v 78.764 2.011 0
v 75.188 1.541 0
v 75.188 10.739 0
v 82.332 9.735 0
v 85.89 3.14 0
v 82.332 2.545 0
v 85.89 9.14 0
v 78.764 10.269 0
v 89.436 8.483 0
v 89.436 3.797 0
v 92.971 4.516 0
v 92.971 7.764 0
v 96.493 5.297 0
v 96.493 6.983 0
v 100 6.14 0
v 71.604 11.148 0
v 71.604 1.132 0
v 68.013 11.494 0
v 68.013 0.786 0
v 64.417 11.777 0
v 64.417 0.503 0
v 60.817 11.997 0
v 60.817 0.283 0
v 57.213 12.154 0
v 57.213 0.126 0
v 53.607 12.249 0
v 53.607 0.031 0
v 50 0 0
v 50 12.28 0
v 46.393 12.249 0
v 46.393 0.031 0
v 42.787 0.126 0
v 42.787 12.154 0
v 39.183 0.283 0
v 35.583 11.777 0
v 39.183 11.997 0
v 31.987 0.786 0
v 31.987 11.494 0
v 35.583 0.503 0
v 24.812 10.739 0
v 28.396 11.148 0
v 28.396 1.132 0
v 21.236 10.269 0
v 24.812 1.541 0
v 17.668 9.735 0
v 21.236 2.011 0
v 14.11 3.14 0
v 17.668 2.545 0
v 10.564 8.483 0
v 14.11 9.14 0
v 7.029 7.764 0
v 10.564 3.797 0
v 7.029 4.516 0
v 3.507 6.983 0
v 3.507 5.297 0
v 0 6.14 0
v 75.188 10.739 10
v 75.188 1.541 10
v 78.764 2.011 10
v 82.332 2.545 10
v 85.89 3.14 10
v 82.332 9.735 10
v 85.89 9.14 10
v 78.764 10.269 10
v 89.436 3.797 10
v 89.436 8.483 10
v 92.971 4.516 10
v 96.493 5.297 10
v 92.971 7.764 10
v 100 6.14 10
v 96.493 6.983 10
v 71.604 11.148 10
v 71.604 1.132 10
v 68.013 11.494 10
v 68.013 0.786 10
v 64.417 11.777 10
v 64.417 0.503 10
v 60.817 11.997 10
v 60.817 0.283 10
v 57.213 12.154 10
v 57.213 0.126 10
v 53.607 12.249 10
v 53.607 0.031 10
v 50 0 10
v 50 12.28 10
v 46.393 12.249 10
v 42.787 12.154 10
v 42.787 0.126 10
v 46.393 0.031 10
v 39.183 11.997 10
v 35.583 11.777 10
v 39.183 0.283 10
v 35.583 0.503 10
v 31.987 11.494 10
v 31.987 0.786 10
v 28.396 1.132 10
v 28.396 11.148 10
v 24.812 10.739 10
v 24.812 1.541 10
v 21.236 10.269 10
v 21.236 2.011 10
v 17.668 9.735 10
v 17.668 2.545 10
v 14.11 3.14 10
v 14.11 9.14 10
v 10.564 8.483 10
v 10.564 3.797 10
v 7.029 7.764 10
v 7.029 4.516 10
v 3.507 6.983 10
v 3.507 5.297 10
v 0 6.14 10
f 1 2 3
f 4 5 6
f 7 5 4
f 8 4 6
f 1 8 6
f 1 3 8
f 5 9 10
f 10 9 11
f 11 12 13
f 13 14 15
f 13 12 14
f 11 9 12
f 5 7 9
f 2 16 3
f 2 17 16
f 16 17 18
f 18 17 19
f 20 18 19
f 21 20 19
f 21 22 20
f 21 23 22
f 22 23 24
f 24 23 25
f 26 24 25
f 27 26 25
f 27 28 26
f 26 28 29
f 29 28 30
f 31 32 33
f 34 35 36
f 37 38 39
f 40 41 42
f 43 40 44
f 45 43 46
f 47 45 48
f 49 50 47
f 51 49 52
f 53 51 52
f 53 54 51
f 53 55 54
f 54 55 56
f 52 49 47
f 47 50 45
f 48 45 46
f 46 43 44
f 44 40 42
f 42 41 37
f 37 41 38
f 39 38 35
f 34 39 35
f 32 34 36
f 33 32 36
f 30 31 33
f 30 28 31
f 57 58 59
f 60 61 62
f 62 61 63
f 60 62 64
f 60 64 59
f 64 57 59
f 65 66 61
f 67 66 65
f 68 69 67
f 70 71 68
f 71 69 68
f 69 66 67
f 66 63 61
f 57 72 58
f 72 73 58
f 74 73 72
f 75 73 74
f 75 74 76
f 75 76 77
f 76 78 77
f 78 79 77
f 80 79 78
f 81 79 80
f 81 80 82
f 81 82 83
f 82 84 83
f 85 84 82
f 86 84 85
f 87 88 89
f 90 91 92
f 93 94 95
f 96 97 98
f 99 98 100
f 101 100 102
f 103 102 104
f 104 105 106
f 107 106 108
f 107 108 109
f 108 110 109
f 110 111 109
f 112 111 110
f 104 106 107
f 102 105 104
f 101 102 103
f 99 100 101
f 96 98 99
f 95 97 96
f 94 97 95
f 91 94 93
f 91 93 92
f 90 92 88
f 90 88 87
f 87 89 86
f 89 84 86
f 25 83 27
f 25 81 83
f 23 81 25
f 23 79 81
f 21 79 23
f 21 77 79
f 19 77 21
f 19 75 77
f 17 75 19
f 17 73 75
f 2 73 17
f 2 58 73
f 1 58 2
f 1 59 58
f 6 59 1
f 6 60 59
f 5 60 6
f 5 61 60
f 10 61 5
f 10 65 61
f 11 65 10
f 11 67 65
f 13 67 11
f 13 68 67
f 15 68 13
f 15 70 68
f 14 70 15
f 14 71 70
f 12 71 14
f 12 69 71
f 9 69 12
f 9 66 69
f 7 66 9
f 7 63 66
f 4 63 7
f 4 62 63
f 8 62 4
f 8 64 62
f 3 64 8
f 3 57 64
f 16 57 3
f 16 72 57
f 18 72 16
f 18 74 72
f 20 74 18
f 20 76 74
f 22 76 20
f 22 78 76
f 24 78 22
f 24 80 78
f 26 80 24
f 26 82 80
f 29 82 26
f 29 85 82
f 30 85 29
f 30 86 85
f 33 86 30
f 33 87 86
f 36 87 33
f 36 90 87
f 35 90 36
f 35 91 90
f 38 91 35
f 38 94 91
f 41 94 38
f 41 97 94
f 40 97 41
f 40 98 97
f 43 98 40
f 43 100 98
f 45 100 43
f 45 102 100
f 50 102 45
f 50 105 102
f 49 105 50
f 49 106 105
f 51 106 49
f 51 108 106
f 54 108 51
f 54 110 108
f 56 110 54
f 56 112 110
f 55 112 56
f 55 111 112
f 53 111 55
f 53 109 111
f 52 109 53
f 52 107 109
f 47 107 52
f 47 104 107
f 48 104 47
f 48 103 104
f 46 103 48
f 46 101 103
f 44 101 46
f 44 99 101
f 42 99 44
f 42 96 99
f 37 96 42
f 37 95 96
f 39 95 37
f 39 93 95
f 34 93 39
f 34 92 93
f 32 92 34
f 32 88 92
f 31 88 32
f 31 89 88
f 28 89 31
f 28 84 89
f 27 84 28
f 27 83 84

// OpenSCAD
$fn = 32;

// ----------------------------------------------------------------------
// Arc profile plate: lens, 56 points
// ----------------------------------------------------------------------

// --- parameters (mm) ---
lens_chord = 100;         // chord length of the lens, X
arc_r = 206.68;           // radius of both arcs
arc_angle = 28;           // angle of each arc, degrees
sagitta = 6.14;           // bulge of each arc (half the lens height)
arc_step = 1;             // sampling step of the arcs, degrees
plate_t = 10;             // plate thickness, Z

bbox_y = 2 * sagitta;  // full lens height

profile = [[100, 6.14], [96.493, 6.983], [92.971, 7.764], [89.436, 8.483], [85.89, 9.14], [82.332, 9.735], [78.764, 10.269], [75.188, 10.739], [71.604, 11.148], [68.013, 11.494], [64.417, 11.777], [60.817, 11.997], [57.213, 12.154], [53.607, 12.249], [50, 12.28], [46.393, 12.249], [42.787, 12.154], [39.183, 11.997], [35.583, 11.777], [31.987, 11.494], [28.396, 11.148], [24.812, 10.739], [21.236, 10.269], [17.668, 9.735], [14.11, 9.14], [10.564, 8.483], [7.029, 7.764], [3.507, 6.983], [0, 6.14], [3.507, 5.297], [7.029, 4.516], [10.564, 3.797], [14.11, 3.14], [17.668, 2.545], [21.236, 2.011], [24.812, 1.541], [28.396, 1.132], [31.987, 0.786], [35.583, 0.503], [39.183, 0.283], [42.787, 0.126], [46.393, 0.031], [50, 0], [53.607, 0.031], [57.213, 0.126], [60.817, 0.283], [64.417, 0.503], [68.013, 0.786], [71.604, 1.132], [75.188, 1.541], [78.764, 2.011], [82.332, 2.545], [85.89, 3.14], [89.436, 3.797], [92.971, 4.516], [96.493, 5.297]];  // primary outline, 56 points, counter clockwise

// --- the one profile operation ---
linear_extrude(height = plate_t) polygon(points = profile);
